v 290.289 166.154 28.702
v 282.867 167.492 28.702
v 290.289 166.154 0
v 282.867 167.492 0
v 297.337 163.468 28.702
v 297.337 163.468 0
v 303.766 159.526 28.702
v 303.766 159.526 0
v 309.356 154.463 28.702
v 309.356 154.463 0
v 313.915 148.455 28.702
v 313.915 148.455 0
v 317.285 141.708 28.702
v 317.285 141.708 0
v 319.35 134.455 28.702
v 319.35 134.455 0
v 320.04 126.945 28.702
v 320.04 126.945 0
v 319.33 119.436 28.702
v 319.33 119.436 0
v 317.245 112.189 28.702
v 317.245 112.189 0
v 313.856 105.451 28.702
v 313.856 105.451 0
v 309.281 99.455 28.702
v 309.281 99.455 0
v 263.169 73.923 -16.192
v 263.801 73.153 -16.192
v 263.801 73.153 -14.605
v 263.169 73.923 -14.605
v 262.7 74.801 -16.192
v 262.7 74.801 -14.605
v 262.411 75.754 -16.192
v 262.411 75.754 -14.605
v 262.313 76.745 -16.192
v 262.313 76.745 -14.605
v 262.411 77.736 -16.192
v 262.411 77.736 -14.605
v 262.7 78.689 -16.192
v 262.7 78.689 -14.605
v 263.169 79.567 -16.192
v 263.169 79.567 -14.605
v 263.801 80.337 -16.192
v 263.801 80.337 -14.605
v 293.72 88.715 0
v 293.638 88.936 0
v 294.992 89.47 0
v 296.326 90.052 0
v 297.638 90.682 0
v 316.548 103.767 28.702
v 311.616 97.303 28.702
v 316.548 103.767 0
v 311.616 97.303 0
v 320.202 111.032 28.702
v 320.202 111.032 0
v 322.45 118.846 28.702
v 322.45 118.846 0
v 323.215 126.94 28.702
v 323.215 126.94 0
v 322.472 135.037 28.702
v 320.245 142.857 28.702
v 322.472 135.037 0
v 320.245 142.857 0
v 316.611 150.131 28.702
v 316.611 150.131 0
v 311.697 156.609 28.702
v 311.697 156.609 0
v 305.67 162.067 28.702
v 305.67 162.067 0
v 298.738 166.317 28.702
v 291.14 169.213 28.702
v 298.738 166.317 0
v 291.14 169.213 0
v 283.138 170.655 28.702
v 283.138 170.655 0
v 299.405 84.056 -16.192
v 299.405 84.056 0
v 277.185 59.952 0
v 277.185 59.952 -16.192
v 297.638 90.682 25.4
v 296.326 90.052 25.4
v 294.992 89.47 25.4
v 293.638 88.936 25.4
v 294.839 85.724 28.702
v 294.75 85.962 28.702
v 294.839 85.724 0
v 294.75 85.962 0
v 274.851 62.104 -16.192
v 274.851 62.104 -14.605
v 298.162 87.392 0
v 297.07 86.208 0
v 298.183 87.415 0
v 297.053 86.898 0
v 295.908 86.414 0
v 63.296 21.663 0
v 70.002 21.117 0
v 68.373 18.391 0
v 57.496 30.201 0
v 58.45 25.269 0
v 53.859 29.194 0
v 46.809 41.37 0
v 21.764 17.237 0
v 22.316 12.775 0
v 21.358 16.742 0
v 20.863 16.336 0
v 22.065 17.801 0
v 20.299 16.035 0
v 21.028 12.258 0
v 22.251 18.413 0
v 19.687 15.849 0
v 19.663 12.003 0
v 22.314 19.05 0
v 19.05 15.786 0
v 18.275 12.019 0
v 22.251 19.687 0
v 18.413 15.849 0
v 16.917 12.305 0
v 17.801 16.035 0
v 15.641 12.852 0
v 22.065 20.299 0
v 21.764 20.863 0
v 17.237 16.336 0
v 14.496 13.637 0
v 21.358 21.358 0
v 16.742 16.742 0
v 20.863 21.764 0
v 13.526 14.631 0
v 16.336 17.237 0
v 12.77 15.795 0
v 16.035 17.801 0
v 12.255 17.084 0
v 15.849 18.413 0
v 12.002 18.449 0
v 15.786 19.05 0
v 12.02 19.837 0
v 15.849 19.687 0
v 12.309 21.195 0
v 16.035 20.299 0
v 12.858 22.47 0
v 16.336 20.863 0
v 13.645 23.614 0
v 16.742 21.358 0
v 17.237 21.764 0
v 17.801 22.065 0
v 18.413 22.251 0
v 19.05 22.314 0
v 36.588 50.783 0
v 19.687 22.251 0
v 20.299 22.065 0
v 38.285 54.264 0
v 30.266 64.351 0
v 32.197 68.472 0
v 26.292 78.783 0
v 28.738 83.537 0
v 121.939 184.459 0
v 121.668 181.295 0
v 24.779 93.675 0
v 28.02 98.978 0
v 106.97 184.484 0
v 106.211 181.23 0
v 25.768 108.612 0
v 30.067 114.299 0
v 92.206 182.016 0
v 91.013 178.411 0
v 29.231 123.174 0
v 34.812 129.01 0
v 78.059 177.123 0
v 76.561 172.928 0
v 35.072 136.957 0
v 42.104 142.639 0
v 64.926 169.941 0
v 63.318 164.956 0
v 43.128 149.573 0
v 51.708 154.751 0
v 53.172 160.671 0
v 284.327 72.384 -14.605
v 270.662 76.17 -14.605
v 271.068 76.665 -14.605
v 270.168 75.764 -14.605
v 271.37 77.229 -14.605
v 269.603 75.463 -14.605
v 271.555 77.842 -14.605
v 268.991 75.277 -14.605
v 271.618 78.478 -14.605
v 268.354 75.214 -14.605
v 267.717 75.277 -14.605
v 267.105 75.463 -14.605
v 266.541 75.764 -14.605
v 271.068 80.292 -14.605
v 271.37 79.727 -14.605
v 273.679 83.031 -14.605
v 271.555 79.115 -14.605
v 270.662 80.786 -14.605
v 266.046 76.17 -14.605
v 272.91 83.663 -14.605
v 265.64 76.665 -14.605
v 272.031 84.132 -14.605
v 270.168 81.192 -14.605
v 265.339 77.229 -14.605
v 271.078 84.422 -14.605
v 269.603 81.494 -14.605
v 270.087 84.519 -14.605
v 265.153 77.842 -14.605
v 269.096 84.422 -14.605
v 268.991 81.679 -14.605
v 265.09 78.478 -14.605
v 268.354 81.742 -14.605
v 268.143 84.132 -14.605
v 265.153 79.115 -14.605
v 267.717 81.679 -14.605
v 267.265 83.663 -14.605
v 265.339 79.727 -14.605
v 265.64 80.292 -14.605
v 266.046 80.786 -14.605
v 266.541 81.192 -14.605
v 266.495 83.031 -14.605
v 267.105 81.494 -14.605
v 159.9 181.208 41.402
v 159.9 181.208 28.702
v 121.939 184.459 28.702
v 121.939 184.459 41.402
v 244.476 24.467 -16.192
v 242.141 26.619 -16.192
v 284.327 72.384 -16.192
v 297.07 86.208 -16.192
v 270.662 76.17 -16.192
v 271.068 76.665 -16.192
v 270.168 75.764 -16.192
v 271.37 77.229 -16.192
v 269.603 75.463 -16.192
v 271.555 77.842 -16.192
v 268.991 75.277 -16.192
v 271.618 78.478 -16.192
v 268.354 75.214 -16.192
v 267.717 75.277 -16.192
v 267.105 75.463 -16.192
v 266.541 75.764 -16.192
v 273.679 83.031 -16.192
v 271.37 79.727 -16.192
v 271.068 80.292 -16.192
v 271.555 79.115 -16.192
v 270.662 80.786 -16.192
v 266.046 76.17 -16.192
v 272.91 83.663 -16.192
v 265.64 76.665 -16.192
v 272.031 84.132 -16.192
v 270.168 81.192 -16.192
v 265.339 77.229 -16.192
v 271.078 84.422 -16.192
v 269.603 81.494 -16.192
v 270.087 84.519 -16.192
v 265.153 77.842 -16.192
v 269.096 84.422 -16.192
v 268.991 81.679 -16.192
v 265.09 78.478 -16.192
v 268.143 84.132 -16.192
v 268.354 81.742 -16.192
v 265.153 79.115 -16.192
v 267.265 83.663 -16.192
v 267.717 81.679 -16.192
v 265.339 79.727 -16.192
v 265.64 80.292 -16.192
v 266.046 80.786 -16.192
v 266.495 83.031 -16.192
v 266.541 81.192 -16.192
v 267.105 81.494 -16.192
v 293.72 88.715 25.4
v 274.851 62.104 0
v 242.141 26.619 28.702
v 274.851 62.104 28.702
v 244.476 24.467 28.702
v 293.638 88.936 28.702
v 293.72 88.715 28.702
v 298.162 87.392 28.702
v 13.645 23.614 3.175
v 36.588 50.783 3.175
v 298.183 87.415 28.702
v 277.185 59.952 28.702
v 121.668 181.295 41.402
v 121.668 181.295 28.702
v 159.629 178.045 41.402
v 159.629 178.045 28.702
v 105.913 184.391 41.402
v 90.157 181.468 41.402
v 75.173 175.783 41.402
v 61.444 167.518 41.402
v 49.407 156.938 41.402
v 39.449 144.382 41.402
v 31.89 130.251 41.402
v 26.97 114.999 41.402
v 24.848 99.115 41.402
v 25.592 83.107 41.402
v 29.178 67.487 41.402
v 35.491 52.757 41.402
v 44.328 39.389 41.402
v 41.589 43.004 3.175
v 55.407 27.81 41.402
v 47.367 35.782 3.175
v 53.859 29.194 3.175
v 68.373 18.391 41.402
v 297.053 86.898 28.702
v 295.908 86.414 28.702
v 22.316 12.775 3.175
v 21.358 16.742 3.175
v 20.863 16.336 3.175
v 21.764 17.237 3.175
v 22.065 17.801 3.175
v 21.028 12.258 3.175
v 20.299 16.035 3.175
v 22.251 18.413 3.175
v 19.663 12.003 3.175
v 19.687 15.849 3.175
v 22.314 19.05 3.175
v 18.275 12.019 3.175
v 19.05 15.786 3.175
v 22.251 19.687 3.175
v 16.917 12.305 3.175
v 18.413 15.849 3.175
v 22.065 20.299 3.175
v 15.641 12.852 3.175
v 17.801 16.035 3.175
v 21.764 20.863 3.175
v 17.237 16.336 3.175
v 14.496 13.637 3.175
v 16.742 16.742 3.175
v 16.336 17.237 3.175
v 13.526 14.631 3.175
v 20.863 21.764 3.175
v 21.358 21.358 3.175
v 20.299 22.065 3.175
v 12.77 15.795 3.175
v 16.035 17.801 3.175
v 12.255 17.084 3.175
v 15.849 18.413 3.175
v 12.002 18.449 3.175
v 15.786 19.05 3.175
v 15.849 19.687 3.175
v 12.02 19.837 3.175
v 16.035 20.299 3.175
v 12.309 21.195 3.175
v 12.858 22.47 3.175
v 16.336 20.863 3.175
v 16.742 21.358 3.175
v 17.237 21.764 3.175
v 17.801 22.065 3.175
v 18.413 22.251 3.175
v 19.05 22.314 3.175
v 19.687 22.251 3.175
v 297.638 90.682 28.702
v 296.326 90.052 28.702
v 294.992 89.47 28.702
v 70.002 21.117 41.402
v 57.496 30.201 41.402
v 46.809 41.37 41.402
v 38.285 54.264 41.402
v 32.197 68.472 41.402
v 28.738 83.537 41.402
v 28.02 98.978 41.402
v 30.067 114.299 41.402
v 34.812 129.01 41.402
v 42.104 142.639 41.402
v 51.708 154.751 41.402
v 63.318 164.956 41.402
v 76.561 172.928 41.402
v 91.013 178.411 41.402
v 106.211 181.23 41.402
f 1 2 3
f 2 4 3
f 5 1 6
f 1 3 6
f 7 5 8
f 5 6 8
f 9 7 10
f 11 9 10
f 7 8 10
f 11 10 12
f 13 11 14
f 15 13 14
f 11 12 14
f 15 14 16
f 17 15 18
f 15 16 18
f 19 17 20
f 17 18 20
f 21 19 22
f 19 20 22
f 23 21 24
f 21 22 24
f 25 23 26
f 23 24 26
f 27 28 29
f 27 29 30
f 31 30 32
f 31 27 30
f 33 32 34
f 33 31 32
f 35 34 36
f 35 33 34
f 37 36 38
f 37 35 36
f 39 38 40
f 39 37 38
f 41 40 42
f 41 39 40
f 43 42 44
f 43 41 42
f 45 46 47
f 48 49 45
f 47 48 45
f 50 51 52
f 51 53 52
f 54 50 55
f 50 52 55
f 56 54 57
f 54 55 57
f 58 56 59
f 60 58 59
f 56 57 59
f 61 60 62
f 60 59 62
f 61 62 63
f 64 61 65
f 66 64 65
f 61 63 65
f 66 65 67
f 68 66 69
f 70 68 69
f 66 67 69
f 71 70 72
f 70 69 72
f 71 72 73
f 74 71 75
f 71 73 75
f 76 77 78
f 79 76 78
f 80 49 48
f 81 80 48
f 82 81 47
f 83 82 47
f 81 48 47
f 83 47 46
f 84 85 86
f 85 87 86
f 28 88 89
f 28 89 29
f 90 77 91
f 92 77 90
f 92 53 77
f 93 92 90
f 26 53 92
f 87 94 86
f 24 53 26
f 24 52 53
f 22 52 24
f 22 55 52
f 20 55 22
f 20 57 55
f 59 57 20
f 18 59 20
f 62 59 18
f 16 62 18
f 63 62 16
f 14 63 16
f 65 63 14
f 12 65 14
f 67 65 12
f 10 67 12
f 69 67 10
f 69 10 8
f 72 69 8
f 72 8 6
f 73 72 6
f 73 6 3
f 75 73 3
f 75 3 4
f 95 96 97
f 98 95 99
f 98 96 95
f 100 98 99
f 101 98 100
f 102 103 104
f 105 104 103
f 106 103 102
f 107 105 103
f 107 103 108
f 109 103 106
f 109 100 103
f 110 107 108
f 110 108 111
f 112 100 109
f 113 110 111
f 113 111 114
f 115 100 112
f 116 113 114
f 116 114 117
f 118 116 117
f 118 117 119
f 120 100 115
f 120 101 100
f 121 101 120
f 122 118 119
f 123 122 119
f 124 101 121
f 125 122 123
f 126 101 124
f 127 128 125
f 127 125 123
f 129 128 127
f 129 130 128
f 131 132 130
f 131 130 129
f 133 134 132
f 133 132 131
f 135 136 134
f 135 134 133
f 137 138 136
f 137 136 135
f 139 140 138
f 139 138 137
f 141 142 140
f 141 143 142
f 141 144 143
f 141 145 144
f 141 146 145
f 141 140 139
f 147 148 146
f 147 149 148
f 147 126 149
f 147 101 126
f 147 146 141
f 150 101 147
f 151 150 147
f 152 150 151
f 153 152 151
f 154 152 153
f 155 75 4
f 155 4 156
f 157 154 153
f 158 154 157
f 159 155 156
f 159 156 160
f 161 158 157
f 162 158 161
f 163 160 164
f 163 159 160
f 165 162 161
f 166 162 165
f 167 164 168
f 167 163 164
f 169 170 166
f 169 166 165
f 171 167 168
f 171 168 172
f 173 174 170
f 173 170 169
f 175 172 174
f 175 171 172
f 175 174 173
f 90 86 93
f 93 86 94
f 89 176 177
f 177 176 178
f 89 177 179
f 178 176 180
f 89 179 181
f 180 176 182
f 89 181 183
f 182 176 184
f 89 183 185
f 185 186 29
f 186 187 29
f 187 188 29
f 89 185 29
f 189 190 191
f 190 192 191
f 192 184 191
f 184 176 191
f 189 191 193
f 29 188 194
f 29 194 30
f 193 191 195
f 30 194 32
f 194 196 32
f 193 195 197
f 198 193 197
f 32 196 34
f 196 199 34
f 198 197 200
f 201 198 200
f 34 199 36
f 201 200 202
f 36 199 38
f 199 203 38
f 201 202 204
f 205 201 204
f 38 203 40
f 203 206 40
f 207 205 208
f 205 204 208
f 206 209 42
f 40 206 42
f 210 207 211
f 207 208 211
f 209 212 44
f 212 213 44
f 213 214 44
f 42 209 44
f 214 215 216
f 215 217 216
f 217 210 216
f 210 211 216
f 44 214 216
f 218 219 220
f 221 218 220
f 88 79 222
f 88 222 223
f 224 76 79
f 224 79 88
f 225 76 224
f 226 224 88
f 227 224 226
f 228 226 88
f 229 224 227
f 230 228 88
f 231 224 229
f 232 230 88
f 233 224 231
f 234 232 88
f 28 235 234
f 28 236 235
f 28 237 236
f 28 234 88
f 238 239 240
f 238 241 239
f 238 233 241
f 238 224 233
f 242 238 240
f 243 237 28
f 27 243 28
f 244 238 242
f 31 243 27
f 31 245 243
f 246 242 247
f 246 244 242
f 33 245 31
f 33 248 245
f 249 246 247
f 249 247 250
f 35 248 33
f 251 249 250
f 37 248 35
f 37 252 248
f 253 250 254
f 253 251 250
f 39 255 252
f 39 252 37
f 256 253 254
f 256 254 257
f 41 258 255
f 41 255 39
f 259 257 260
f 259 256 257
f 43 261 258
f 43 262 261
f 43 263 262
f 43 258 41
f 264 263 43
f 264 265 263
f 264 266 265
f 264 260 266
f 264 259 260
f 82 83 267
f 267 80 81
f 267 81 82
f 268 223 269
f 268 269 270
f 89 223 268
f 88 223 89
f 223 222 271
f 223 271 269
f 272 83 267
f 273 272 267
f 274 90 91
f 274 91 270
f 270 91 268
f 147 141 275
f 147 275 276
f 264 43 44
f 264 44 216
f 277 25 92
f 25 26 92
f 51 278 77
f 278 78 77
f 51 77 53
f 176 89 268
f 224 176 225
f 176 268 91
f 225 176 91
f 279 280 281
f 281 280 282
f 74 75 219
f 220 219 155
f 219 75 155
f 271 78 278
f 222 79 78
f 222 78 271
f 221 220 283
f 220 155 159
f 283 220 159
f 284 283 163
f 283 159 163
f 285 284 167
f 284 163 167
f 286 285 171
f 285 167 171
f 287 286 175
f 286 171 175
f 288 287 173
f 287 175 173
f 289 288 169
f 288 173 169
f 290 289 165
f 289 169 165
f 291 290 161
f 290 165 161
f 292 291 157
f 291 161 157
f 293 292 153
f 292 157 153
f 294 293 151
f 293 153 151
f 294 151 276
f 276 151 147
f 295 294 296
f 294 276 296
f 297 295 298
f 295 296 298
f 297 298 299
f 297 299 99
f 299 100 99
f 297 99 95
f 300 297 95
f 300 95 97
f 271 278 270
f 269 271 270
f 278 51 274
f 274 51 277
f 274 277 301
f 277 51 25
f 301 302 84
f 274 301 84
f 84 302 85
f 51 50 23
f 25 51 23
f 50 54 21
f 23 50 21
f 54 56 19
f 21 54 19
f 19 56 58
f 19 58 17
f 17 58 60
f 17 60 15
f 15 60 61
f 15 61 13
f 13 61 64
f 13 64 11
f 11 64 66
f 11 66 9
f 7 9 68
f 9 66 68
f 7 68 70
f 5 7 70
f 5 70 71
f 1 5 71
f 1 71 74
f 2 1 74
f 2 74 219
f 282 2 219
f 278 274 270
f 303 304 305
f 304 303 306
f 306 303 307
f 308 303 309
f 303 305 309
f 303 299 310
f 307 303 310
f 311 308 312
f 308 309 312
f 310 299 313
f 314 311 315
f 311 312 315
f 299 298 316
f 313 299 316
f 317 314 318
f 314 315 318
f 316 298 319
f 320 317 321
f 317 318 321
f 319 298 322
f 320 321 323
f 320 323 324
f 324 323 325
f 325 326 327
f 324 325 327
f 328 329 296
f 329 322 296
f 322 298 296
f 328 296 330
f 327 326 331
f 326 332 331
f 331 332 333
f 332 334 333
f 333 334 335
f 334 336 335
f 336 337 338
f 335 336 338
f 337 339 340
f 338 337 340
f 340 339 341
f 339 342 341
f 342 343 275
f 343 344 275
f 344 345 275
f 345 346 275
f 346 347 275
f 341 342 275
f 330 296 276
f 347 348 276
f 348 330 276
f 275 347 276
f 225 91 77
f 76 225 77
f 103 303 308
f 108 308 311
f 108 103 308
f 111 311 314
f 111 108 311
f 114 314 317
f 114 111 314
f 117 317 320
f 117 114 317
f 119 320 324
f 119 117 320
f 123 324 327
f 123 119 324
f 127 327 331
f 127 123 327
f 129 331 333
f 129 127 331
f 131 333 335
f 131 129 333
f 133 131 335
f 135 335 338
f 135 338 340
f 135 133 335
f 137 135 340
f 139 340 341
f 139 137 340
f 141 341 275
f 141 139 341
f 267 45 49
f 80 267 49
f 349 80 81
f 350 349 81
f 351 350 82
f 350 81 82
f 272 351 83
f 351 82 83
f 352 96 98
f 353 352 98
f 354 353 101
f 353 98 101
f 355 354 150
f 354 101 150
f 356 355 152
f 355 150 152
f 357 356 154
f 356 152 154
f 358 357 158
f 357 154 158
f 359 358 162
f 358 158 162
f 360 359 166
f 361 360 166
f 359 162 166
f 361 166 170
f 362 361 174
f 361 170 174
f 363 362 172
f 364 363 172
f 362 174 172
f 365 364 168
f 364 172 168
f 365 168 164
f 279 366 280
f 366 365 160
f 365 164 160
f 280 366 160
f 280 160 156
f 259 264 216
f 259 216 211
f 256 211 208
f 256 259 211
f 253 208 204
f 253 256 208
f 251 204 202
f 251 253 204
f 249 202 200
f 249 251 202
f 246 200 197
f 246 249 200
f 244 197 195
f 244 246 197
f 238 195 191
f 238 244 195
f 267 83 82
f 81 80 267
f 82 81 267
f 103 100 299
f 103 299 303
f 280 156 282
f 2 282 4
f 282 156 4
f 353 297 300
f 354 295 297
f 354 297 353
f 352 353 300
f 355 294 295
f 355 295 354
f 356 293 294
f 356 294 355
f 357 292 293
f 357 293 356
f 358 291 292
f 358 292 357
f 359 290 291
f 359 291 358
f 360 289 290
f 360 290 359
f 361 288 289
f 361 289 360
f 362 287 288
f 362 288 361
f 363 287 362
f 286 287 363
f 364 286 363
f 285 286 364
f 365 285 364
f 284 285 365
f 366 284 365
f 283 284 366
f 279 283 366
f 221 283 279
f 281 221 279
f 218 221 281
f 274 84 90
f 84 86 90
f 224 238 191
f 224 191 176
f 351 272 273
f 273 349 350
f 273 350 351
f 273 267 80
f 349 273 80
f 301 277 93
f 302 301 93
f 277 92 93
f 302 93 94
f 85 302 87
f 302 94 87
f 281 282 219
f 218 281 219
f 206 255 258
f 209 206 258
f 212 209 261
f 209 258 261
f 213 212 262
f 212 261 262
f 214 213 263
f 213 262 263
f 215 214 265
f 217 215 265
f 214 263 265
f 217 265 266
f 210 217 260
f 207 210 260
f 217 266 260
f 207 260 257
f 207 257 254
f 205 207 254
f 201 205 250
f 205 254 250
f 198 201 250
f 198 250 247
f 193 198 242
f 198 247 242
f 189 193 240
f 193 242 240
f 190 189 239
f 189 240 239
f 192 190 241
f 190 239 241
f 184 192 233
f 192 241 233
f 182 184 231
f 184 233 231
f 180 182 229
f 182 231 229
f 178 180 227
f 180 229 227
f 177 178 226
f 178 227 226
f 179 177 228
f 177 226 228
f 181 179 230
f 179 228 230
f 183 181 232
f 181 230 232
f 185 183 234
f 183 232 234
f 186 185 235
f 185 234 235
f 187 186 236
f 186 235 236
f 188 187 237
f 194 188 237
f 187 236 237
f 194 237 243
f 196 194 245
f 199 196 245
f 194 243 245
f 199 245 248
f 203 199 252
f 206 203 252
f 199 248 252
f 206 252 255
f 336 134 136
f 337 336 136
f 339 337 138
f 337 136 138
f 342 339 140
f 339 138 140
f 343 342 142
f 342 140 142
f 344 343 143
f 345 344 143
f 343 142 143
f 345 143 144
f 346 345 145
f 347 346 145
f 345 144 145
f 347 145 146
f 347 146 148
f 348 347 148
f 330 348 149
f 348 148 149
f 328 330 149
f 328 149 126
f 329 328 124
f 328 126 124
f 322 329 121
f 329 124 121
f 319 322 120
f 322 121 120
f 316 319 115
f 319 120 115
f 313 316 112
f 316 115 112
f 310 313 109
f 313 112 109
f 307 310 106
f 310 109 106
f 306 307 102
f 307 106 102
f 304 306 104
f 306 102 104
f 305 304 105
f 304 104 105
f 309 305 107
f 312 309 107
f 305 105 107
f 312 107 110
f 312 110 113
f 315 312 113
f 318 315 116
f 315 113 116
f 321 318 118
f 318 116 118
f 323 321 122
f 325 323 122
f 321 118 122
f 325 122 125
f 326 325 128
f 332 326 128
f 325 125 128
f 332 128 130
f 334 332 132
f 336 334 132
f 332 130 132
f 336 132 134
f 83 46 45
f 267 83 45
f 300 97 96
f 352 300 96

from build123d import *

# Parameters (mm, degrees)
BOSS_EXTRUDE1_DEPTH   = 25.4
BOSS_EXTRUDE1_2_DEPTH = 25.4
SKETCH2_R             = 7.0739
SKETCH2_R_2           = 3.2639
BOSS_EXTRUDE2_DEPTH   = 3.175
BOSS_EXTRUDE3_DEPTH   = 3.302
BOSS_EXTRUDE4_DEPTH   = 12.7
BOSS_EXTRUDE5_DEPTH   = 16.1925
SKETCH6_R             = 3.2639
BOSS_EXTRUDE6_DEPTH   = 1.5875
BOSS_EXTRUDE7_DEPTH   = 44.8945


with BuildPart() as part:
    # Sketch1 → Boss-Extrude1 (new body)
    with BuildSketch(Plane.XY):
        with BuildLine():
            ThreePointArc((70.001721328, 21.116929737), (32.109818913, 121.760822938), (121.667937999, 181.295122405))
            Line((121.667937999, 181.295122405), (282.867264941, 167.491822308))
            ThreePointArc((282.867264941, 167.491822308), (317.285019746, 141.708326855), (309.281467912, 99.455354869))
            Line((309.281467912, 99.455354869), (298.182872237, 87.415180491))
            ThreePointArc((298.182872237, 87.415180491), (296.481974793, 86.652009193), (294.750152503, 85.961883046))
            Line((294.750152503, 85.961883046), (294.839214659, 85.723778364))
            Line((294.839214659, 85.723778364), (298.161838441, 87.392362238))
            Line((298.161838441, 87.392362238), (274.850661498, 62.103519979))
            Line((274.850661498, 62.103519979), (277.185151179, 59.951594578))
            Line((277.185151179, 59.951594578), (311.615957593, 97.303429468))
            ThreePointArc((311.615957593, 97.303429468), (320.244786914, 142.85741489), (283.138145015, 170.655245926))
            Line((283.138145015, 170.655245926), (121.938818073, 184.458546023))
            ThreePointArc((121.938818073, 184.458546023), (29.088121079, 122.735485546), (68.373108141, 18.391449213))
            Line((68.373108141, 18.391449213), (70.001721328, 21.116929737))
        make_face()
    extrude(amount=BOSS_EXTRUDE1_DEPTH)

    # Sketch2 → Boss-Extrude2 (add)
    # profile 1 of 2: a face of its own
    with BuildSketch(Plane(origin=(0, 0, 0), x_dir=(-1, 0, 0), z_dir=(0, 0, -1))):
        with BuildLine():
            ThreePointArc((-36.587701927, 50.782990283), (-44.384911147, 39.317928918), (-53.858754358, 29.194174745))
            Line((-53.858754358, 29.194174745), (-22.316186857, 12.775282108))
            ThreePointArc((-22.316186857, 12.775282108), (-23.932636358, 13.931413925), (-25.163710326, 15.491544259))
            ThreePointArc((-25.163710326, 15.491544259), (-23.930769686, 24.17036605), (-15.202863294, 24.986295173))
            ThreePointArc((-15.202863294, 24.986295173), (-14.373460165, 24.357545231), (-13.645291854, 23.613900861))
            Line((-13.645291854, 23.613900861), (-36.587701927, 50.782990283))
        make_face()
    # profile 2 of 2: a face of its own
    with BuildSketch(Plane(origin=(0, 0, 0), x_dir=(-1, 0, 0), z_dir=(0, 0, -1))):
        with Locations((-19.05, 19.05)):
            Circle(SKETCH2_R)
        with Locations((-19.05, 19.05)):
            Circle(SKETCH2_R_2, mode=Mode.SUBTRACT)
    extrude(amount=-BOSS_EXTRUDE2_DEPTH)

    # Sketch3 → Boss-Extrude3 (add)
    with BuildSketch(Plane.XY.offset(25.4)):
        with BuildLine():
            Line((68.373108141, 18.391449213), (70.001721328, 21.116929737))
            ThreePointArc((70.001721328, 21.116929737), (32.109818913, 121.760822938), (121.667937999, 181.295122405))
            Line((121.667937999, 181.295122405), (282.867264941, 167.491822308))
            ThreePointArc((282.867264941, 167.491822308), (317.285019746, 141.708326855), (309.281467912, 99.455354869))
            Line((309.281467912, 99.455354869), (298.182872237, 87.415180491))
            ThreePointArc((298.182872237, 87.415180491), (296.481974793, 86.652009193), (294.750152503, 85.961883046))
            Line((294.750152503, 85.961883046), (294.839214659, 85.723778364))
            Line((294.839214659, 85.723778364), (298.161838441, 87.392362238))
            Line((298.161838441, 87.392362238), (274.850661498, 62.103519979))
            Line((274.850661498, 62.103519979), (277.185151179, 59.951594578))
            Line((277.185151179, 59.951594578), (311.615957593, 97.303429468))
            ThreePointArc((311.615957593, 97.303429468), (320.244786914, 142.85741489), (283.138145015, 170.655245926))
            Line((283.138145015, 170.655245926), (121.938818073, 184.458546023))
            ThreePointArc((121.938818073, 184.458546023), (29.088121079, 122.735485546), (68.373108141, 18.391449213))
        make_face()
        with BuildLine():
            Line((293.637822612, 88.935659637), (293.720430988, 88.714808918))
            Line((293.720430988, 88.714808918), (297.638321365, 90.682328905))
            ThreePointArc((297.638321365, 90.682328905), (295.661540372, 89.755243259), (293.637822612, 88.935659637))
        make_face()
    extrude(amount=BOSS_EXTRUDE3_DEPTH)


with BuildPart() as body_2:
    # Sketch1 → Boss-Extrude1 2 (new body)
    with BuildSketch(Plane.XY):
        with BuildLine():
            ThreePointArc((297.638321365, 90.682328905), (295.661540372, 89.755243259), (293.637822612, 88.935659637))
            Line((293.637822612, 88.935659637), (293.720430988, 88.714808918))
            Line((293.720430988, 88.714808918), (297.638321365, 90.682328905))
        make_face()
    extrude(amount=BOSS_EXTRUDE1_2_DEPTH)


with BuildPart() as boss_extrude3_piece_1:
    # of the separate pieces the step leaves, piece 1, a body of its own (boss_extrude3_pieces)
    add(part.part.solids().sort_by_distance((70.001721328, 21.116929737, 28.702))[0])

    # Sketch4 → Boss-Extrude4 (add)
    with BuildSketch(Plane.XY.offset(28.702)):
        with BuildLine():
            Line((121.667937999, 181.295122405), (159.629021413, 178.044561523))
            Line((159.629021413, 178.044561523), (159.899901487, 181.207985141))
            Line((159.899901487, 181.207985141), (121.938818073, 184.458546023))
            ThreePointArc((121.938818073, 184.458546023), (29.088121079, 122.735485546), (68.373108141, 18.391449213))
            Line((68.373108141, 18.391449213), (70.001721328, 21.116929737))
            ThreePointArc((70.001721328, 21.116929737), (32.109818913, 121.760822938), (121.667937999, 181.295122405))
        make_face()
    extrude(amount=BOSS_EXTRUDE4_DEPTH)

    # Sketch5 → Boss-Extrude5 (add)
    with BuildSketch(Plane(origin=(0, 0, 0), x_dir=(-1, 0, 0), z_dir=(0, 0, -1))):
        Polygon((-277.185151179, 59.951594578), (-274.850661498, 62.103519979), (-297.070096233, 86.207999194), (-299.404585914, 84.056073793), align=None)
    extrude(amount=BOSS_EXTRUDE5_DEPTH)

    # Sketch6 → Boss-Extrude6 (add)
    with BuildSketch(Plane(origin=(0, 0, -16.1925), x_dir=(-1, 0, 0), z_dir=(0, 0, -1))):
        with BuildLine():
            Line((-274.850661498, 62.103519979), (-263.801215322, 73.152966154))
            ThreePointArc((-263.801215322, 73.152966154), (-262.313317771, 76.745068603), (-263.801215322, 80.337171051))
            Line((-263.801215322, 80.337171051), (-266.495292159, 83.031247888))
            ThreePointArc((-266.495292159, 83.031247888), (-270.087394607, 84.519145439), (-273.679497055, 83.031247888))
            Line((-273.679497055, 83.031247888), (-284.326969415, 72.383775528))
            Line((-284.326969415, 72.383775528), (-274.850661498, 62.103519979))
        make_face()
        with Locations((-268.354205176, 78.478258034)):
            Circle(SKETCH6_R, mode=Mode.SUBTRACT)
    extrude(amount=-BOSS_EXTRUDE6_DEPTH)

    # Sketch7 → Boss-Extrude7 (add)
    with BuildSketch(Plane(origin=(0, 0, -16.1925), x_dir=(-1, 0, 0), z_dir=(0, 0, -1))):
        Polygon((-277.185151179, 59.951594578), (-244.475885085, 24.467351432), (-242.141395404, 26.619276833), (-274.850661498, 62.103519979), align=None)
    extrude(amount=-BOSS_EXTRUDE7_DEPTH)


with BuildPart() as boss_extrude3_piece_2:
    # of the separate pieces the step leaves, piece 2, a body of its own (boss_extrude3_pieces)
    add(part.part.solids().sort_by_distance((293.637822612, 88.935659637, 25.4))[0])


solid = Compound([body_2.part, boss_extrude3_piece_1.part, boss_extrude3_piece_2.part])
